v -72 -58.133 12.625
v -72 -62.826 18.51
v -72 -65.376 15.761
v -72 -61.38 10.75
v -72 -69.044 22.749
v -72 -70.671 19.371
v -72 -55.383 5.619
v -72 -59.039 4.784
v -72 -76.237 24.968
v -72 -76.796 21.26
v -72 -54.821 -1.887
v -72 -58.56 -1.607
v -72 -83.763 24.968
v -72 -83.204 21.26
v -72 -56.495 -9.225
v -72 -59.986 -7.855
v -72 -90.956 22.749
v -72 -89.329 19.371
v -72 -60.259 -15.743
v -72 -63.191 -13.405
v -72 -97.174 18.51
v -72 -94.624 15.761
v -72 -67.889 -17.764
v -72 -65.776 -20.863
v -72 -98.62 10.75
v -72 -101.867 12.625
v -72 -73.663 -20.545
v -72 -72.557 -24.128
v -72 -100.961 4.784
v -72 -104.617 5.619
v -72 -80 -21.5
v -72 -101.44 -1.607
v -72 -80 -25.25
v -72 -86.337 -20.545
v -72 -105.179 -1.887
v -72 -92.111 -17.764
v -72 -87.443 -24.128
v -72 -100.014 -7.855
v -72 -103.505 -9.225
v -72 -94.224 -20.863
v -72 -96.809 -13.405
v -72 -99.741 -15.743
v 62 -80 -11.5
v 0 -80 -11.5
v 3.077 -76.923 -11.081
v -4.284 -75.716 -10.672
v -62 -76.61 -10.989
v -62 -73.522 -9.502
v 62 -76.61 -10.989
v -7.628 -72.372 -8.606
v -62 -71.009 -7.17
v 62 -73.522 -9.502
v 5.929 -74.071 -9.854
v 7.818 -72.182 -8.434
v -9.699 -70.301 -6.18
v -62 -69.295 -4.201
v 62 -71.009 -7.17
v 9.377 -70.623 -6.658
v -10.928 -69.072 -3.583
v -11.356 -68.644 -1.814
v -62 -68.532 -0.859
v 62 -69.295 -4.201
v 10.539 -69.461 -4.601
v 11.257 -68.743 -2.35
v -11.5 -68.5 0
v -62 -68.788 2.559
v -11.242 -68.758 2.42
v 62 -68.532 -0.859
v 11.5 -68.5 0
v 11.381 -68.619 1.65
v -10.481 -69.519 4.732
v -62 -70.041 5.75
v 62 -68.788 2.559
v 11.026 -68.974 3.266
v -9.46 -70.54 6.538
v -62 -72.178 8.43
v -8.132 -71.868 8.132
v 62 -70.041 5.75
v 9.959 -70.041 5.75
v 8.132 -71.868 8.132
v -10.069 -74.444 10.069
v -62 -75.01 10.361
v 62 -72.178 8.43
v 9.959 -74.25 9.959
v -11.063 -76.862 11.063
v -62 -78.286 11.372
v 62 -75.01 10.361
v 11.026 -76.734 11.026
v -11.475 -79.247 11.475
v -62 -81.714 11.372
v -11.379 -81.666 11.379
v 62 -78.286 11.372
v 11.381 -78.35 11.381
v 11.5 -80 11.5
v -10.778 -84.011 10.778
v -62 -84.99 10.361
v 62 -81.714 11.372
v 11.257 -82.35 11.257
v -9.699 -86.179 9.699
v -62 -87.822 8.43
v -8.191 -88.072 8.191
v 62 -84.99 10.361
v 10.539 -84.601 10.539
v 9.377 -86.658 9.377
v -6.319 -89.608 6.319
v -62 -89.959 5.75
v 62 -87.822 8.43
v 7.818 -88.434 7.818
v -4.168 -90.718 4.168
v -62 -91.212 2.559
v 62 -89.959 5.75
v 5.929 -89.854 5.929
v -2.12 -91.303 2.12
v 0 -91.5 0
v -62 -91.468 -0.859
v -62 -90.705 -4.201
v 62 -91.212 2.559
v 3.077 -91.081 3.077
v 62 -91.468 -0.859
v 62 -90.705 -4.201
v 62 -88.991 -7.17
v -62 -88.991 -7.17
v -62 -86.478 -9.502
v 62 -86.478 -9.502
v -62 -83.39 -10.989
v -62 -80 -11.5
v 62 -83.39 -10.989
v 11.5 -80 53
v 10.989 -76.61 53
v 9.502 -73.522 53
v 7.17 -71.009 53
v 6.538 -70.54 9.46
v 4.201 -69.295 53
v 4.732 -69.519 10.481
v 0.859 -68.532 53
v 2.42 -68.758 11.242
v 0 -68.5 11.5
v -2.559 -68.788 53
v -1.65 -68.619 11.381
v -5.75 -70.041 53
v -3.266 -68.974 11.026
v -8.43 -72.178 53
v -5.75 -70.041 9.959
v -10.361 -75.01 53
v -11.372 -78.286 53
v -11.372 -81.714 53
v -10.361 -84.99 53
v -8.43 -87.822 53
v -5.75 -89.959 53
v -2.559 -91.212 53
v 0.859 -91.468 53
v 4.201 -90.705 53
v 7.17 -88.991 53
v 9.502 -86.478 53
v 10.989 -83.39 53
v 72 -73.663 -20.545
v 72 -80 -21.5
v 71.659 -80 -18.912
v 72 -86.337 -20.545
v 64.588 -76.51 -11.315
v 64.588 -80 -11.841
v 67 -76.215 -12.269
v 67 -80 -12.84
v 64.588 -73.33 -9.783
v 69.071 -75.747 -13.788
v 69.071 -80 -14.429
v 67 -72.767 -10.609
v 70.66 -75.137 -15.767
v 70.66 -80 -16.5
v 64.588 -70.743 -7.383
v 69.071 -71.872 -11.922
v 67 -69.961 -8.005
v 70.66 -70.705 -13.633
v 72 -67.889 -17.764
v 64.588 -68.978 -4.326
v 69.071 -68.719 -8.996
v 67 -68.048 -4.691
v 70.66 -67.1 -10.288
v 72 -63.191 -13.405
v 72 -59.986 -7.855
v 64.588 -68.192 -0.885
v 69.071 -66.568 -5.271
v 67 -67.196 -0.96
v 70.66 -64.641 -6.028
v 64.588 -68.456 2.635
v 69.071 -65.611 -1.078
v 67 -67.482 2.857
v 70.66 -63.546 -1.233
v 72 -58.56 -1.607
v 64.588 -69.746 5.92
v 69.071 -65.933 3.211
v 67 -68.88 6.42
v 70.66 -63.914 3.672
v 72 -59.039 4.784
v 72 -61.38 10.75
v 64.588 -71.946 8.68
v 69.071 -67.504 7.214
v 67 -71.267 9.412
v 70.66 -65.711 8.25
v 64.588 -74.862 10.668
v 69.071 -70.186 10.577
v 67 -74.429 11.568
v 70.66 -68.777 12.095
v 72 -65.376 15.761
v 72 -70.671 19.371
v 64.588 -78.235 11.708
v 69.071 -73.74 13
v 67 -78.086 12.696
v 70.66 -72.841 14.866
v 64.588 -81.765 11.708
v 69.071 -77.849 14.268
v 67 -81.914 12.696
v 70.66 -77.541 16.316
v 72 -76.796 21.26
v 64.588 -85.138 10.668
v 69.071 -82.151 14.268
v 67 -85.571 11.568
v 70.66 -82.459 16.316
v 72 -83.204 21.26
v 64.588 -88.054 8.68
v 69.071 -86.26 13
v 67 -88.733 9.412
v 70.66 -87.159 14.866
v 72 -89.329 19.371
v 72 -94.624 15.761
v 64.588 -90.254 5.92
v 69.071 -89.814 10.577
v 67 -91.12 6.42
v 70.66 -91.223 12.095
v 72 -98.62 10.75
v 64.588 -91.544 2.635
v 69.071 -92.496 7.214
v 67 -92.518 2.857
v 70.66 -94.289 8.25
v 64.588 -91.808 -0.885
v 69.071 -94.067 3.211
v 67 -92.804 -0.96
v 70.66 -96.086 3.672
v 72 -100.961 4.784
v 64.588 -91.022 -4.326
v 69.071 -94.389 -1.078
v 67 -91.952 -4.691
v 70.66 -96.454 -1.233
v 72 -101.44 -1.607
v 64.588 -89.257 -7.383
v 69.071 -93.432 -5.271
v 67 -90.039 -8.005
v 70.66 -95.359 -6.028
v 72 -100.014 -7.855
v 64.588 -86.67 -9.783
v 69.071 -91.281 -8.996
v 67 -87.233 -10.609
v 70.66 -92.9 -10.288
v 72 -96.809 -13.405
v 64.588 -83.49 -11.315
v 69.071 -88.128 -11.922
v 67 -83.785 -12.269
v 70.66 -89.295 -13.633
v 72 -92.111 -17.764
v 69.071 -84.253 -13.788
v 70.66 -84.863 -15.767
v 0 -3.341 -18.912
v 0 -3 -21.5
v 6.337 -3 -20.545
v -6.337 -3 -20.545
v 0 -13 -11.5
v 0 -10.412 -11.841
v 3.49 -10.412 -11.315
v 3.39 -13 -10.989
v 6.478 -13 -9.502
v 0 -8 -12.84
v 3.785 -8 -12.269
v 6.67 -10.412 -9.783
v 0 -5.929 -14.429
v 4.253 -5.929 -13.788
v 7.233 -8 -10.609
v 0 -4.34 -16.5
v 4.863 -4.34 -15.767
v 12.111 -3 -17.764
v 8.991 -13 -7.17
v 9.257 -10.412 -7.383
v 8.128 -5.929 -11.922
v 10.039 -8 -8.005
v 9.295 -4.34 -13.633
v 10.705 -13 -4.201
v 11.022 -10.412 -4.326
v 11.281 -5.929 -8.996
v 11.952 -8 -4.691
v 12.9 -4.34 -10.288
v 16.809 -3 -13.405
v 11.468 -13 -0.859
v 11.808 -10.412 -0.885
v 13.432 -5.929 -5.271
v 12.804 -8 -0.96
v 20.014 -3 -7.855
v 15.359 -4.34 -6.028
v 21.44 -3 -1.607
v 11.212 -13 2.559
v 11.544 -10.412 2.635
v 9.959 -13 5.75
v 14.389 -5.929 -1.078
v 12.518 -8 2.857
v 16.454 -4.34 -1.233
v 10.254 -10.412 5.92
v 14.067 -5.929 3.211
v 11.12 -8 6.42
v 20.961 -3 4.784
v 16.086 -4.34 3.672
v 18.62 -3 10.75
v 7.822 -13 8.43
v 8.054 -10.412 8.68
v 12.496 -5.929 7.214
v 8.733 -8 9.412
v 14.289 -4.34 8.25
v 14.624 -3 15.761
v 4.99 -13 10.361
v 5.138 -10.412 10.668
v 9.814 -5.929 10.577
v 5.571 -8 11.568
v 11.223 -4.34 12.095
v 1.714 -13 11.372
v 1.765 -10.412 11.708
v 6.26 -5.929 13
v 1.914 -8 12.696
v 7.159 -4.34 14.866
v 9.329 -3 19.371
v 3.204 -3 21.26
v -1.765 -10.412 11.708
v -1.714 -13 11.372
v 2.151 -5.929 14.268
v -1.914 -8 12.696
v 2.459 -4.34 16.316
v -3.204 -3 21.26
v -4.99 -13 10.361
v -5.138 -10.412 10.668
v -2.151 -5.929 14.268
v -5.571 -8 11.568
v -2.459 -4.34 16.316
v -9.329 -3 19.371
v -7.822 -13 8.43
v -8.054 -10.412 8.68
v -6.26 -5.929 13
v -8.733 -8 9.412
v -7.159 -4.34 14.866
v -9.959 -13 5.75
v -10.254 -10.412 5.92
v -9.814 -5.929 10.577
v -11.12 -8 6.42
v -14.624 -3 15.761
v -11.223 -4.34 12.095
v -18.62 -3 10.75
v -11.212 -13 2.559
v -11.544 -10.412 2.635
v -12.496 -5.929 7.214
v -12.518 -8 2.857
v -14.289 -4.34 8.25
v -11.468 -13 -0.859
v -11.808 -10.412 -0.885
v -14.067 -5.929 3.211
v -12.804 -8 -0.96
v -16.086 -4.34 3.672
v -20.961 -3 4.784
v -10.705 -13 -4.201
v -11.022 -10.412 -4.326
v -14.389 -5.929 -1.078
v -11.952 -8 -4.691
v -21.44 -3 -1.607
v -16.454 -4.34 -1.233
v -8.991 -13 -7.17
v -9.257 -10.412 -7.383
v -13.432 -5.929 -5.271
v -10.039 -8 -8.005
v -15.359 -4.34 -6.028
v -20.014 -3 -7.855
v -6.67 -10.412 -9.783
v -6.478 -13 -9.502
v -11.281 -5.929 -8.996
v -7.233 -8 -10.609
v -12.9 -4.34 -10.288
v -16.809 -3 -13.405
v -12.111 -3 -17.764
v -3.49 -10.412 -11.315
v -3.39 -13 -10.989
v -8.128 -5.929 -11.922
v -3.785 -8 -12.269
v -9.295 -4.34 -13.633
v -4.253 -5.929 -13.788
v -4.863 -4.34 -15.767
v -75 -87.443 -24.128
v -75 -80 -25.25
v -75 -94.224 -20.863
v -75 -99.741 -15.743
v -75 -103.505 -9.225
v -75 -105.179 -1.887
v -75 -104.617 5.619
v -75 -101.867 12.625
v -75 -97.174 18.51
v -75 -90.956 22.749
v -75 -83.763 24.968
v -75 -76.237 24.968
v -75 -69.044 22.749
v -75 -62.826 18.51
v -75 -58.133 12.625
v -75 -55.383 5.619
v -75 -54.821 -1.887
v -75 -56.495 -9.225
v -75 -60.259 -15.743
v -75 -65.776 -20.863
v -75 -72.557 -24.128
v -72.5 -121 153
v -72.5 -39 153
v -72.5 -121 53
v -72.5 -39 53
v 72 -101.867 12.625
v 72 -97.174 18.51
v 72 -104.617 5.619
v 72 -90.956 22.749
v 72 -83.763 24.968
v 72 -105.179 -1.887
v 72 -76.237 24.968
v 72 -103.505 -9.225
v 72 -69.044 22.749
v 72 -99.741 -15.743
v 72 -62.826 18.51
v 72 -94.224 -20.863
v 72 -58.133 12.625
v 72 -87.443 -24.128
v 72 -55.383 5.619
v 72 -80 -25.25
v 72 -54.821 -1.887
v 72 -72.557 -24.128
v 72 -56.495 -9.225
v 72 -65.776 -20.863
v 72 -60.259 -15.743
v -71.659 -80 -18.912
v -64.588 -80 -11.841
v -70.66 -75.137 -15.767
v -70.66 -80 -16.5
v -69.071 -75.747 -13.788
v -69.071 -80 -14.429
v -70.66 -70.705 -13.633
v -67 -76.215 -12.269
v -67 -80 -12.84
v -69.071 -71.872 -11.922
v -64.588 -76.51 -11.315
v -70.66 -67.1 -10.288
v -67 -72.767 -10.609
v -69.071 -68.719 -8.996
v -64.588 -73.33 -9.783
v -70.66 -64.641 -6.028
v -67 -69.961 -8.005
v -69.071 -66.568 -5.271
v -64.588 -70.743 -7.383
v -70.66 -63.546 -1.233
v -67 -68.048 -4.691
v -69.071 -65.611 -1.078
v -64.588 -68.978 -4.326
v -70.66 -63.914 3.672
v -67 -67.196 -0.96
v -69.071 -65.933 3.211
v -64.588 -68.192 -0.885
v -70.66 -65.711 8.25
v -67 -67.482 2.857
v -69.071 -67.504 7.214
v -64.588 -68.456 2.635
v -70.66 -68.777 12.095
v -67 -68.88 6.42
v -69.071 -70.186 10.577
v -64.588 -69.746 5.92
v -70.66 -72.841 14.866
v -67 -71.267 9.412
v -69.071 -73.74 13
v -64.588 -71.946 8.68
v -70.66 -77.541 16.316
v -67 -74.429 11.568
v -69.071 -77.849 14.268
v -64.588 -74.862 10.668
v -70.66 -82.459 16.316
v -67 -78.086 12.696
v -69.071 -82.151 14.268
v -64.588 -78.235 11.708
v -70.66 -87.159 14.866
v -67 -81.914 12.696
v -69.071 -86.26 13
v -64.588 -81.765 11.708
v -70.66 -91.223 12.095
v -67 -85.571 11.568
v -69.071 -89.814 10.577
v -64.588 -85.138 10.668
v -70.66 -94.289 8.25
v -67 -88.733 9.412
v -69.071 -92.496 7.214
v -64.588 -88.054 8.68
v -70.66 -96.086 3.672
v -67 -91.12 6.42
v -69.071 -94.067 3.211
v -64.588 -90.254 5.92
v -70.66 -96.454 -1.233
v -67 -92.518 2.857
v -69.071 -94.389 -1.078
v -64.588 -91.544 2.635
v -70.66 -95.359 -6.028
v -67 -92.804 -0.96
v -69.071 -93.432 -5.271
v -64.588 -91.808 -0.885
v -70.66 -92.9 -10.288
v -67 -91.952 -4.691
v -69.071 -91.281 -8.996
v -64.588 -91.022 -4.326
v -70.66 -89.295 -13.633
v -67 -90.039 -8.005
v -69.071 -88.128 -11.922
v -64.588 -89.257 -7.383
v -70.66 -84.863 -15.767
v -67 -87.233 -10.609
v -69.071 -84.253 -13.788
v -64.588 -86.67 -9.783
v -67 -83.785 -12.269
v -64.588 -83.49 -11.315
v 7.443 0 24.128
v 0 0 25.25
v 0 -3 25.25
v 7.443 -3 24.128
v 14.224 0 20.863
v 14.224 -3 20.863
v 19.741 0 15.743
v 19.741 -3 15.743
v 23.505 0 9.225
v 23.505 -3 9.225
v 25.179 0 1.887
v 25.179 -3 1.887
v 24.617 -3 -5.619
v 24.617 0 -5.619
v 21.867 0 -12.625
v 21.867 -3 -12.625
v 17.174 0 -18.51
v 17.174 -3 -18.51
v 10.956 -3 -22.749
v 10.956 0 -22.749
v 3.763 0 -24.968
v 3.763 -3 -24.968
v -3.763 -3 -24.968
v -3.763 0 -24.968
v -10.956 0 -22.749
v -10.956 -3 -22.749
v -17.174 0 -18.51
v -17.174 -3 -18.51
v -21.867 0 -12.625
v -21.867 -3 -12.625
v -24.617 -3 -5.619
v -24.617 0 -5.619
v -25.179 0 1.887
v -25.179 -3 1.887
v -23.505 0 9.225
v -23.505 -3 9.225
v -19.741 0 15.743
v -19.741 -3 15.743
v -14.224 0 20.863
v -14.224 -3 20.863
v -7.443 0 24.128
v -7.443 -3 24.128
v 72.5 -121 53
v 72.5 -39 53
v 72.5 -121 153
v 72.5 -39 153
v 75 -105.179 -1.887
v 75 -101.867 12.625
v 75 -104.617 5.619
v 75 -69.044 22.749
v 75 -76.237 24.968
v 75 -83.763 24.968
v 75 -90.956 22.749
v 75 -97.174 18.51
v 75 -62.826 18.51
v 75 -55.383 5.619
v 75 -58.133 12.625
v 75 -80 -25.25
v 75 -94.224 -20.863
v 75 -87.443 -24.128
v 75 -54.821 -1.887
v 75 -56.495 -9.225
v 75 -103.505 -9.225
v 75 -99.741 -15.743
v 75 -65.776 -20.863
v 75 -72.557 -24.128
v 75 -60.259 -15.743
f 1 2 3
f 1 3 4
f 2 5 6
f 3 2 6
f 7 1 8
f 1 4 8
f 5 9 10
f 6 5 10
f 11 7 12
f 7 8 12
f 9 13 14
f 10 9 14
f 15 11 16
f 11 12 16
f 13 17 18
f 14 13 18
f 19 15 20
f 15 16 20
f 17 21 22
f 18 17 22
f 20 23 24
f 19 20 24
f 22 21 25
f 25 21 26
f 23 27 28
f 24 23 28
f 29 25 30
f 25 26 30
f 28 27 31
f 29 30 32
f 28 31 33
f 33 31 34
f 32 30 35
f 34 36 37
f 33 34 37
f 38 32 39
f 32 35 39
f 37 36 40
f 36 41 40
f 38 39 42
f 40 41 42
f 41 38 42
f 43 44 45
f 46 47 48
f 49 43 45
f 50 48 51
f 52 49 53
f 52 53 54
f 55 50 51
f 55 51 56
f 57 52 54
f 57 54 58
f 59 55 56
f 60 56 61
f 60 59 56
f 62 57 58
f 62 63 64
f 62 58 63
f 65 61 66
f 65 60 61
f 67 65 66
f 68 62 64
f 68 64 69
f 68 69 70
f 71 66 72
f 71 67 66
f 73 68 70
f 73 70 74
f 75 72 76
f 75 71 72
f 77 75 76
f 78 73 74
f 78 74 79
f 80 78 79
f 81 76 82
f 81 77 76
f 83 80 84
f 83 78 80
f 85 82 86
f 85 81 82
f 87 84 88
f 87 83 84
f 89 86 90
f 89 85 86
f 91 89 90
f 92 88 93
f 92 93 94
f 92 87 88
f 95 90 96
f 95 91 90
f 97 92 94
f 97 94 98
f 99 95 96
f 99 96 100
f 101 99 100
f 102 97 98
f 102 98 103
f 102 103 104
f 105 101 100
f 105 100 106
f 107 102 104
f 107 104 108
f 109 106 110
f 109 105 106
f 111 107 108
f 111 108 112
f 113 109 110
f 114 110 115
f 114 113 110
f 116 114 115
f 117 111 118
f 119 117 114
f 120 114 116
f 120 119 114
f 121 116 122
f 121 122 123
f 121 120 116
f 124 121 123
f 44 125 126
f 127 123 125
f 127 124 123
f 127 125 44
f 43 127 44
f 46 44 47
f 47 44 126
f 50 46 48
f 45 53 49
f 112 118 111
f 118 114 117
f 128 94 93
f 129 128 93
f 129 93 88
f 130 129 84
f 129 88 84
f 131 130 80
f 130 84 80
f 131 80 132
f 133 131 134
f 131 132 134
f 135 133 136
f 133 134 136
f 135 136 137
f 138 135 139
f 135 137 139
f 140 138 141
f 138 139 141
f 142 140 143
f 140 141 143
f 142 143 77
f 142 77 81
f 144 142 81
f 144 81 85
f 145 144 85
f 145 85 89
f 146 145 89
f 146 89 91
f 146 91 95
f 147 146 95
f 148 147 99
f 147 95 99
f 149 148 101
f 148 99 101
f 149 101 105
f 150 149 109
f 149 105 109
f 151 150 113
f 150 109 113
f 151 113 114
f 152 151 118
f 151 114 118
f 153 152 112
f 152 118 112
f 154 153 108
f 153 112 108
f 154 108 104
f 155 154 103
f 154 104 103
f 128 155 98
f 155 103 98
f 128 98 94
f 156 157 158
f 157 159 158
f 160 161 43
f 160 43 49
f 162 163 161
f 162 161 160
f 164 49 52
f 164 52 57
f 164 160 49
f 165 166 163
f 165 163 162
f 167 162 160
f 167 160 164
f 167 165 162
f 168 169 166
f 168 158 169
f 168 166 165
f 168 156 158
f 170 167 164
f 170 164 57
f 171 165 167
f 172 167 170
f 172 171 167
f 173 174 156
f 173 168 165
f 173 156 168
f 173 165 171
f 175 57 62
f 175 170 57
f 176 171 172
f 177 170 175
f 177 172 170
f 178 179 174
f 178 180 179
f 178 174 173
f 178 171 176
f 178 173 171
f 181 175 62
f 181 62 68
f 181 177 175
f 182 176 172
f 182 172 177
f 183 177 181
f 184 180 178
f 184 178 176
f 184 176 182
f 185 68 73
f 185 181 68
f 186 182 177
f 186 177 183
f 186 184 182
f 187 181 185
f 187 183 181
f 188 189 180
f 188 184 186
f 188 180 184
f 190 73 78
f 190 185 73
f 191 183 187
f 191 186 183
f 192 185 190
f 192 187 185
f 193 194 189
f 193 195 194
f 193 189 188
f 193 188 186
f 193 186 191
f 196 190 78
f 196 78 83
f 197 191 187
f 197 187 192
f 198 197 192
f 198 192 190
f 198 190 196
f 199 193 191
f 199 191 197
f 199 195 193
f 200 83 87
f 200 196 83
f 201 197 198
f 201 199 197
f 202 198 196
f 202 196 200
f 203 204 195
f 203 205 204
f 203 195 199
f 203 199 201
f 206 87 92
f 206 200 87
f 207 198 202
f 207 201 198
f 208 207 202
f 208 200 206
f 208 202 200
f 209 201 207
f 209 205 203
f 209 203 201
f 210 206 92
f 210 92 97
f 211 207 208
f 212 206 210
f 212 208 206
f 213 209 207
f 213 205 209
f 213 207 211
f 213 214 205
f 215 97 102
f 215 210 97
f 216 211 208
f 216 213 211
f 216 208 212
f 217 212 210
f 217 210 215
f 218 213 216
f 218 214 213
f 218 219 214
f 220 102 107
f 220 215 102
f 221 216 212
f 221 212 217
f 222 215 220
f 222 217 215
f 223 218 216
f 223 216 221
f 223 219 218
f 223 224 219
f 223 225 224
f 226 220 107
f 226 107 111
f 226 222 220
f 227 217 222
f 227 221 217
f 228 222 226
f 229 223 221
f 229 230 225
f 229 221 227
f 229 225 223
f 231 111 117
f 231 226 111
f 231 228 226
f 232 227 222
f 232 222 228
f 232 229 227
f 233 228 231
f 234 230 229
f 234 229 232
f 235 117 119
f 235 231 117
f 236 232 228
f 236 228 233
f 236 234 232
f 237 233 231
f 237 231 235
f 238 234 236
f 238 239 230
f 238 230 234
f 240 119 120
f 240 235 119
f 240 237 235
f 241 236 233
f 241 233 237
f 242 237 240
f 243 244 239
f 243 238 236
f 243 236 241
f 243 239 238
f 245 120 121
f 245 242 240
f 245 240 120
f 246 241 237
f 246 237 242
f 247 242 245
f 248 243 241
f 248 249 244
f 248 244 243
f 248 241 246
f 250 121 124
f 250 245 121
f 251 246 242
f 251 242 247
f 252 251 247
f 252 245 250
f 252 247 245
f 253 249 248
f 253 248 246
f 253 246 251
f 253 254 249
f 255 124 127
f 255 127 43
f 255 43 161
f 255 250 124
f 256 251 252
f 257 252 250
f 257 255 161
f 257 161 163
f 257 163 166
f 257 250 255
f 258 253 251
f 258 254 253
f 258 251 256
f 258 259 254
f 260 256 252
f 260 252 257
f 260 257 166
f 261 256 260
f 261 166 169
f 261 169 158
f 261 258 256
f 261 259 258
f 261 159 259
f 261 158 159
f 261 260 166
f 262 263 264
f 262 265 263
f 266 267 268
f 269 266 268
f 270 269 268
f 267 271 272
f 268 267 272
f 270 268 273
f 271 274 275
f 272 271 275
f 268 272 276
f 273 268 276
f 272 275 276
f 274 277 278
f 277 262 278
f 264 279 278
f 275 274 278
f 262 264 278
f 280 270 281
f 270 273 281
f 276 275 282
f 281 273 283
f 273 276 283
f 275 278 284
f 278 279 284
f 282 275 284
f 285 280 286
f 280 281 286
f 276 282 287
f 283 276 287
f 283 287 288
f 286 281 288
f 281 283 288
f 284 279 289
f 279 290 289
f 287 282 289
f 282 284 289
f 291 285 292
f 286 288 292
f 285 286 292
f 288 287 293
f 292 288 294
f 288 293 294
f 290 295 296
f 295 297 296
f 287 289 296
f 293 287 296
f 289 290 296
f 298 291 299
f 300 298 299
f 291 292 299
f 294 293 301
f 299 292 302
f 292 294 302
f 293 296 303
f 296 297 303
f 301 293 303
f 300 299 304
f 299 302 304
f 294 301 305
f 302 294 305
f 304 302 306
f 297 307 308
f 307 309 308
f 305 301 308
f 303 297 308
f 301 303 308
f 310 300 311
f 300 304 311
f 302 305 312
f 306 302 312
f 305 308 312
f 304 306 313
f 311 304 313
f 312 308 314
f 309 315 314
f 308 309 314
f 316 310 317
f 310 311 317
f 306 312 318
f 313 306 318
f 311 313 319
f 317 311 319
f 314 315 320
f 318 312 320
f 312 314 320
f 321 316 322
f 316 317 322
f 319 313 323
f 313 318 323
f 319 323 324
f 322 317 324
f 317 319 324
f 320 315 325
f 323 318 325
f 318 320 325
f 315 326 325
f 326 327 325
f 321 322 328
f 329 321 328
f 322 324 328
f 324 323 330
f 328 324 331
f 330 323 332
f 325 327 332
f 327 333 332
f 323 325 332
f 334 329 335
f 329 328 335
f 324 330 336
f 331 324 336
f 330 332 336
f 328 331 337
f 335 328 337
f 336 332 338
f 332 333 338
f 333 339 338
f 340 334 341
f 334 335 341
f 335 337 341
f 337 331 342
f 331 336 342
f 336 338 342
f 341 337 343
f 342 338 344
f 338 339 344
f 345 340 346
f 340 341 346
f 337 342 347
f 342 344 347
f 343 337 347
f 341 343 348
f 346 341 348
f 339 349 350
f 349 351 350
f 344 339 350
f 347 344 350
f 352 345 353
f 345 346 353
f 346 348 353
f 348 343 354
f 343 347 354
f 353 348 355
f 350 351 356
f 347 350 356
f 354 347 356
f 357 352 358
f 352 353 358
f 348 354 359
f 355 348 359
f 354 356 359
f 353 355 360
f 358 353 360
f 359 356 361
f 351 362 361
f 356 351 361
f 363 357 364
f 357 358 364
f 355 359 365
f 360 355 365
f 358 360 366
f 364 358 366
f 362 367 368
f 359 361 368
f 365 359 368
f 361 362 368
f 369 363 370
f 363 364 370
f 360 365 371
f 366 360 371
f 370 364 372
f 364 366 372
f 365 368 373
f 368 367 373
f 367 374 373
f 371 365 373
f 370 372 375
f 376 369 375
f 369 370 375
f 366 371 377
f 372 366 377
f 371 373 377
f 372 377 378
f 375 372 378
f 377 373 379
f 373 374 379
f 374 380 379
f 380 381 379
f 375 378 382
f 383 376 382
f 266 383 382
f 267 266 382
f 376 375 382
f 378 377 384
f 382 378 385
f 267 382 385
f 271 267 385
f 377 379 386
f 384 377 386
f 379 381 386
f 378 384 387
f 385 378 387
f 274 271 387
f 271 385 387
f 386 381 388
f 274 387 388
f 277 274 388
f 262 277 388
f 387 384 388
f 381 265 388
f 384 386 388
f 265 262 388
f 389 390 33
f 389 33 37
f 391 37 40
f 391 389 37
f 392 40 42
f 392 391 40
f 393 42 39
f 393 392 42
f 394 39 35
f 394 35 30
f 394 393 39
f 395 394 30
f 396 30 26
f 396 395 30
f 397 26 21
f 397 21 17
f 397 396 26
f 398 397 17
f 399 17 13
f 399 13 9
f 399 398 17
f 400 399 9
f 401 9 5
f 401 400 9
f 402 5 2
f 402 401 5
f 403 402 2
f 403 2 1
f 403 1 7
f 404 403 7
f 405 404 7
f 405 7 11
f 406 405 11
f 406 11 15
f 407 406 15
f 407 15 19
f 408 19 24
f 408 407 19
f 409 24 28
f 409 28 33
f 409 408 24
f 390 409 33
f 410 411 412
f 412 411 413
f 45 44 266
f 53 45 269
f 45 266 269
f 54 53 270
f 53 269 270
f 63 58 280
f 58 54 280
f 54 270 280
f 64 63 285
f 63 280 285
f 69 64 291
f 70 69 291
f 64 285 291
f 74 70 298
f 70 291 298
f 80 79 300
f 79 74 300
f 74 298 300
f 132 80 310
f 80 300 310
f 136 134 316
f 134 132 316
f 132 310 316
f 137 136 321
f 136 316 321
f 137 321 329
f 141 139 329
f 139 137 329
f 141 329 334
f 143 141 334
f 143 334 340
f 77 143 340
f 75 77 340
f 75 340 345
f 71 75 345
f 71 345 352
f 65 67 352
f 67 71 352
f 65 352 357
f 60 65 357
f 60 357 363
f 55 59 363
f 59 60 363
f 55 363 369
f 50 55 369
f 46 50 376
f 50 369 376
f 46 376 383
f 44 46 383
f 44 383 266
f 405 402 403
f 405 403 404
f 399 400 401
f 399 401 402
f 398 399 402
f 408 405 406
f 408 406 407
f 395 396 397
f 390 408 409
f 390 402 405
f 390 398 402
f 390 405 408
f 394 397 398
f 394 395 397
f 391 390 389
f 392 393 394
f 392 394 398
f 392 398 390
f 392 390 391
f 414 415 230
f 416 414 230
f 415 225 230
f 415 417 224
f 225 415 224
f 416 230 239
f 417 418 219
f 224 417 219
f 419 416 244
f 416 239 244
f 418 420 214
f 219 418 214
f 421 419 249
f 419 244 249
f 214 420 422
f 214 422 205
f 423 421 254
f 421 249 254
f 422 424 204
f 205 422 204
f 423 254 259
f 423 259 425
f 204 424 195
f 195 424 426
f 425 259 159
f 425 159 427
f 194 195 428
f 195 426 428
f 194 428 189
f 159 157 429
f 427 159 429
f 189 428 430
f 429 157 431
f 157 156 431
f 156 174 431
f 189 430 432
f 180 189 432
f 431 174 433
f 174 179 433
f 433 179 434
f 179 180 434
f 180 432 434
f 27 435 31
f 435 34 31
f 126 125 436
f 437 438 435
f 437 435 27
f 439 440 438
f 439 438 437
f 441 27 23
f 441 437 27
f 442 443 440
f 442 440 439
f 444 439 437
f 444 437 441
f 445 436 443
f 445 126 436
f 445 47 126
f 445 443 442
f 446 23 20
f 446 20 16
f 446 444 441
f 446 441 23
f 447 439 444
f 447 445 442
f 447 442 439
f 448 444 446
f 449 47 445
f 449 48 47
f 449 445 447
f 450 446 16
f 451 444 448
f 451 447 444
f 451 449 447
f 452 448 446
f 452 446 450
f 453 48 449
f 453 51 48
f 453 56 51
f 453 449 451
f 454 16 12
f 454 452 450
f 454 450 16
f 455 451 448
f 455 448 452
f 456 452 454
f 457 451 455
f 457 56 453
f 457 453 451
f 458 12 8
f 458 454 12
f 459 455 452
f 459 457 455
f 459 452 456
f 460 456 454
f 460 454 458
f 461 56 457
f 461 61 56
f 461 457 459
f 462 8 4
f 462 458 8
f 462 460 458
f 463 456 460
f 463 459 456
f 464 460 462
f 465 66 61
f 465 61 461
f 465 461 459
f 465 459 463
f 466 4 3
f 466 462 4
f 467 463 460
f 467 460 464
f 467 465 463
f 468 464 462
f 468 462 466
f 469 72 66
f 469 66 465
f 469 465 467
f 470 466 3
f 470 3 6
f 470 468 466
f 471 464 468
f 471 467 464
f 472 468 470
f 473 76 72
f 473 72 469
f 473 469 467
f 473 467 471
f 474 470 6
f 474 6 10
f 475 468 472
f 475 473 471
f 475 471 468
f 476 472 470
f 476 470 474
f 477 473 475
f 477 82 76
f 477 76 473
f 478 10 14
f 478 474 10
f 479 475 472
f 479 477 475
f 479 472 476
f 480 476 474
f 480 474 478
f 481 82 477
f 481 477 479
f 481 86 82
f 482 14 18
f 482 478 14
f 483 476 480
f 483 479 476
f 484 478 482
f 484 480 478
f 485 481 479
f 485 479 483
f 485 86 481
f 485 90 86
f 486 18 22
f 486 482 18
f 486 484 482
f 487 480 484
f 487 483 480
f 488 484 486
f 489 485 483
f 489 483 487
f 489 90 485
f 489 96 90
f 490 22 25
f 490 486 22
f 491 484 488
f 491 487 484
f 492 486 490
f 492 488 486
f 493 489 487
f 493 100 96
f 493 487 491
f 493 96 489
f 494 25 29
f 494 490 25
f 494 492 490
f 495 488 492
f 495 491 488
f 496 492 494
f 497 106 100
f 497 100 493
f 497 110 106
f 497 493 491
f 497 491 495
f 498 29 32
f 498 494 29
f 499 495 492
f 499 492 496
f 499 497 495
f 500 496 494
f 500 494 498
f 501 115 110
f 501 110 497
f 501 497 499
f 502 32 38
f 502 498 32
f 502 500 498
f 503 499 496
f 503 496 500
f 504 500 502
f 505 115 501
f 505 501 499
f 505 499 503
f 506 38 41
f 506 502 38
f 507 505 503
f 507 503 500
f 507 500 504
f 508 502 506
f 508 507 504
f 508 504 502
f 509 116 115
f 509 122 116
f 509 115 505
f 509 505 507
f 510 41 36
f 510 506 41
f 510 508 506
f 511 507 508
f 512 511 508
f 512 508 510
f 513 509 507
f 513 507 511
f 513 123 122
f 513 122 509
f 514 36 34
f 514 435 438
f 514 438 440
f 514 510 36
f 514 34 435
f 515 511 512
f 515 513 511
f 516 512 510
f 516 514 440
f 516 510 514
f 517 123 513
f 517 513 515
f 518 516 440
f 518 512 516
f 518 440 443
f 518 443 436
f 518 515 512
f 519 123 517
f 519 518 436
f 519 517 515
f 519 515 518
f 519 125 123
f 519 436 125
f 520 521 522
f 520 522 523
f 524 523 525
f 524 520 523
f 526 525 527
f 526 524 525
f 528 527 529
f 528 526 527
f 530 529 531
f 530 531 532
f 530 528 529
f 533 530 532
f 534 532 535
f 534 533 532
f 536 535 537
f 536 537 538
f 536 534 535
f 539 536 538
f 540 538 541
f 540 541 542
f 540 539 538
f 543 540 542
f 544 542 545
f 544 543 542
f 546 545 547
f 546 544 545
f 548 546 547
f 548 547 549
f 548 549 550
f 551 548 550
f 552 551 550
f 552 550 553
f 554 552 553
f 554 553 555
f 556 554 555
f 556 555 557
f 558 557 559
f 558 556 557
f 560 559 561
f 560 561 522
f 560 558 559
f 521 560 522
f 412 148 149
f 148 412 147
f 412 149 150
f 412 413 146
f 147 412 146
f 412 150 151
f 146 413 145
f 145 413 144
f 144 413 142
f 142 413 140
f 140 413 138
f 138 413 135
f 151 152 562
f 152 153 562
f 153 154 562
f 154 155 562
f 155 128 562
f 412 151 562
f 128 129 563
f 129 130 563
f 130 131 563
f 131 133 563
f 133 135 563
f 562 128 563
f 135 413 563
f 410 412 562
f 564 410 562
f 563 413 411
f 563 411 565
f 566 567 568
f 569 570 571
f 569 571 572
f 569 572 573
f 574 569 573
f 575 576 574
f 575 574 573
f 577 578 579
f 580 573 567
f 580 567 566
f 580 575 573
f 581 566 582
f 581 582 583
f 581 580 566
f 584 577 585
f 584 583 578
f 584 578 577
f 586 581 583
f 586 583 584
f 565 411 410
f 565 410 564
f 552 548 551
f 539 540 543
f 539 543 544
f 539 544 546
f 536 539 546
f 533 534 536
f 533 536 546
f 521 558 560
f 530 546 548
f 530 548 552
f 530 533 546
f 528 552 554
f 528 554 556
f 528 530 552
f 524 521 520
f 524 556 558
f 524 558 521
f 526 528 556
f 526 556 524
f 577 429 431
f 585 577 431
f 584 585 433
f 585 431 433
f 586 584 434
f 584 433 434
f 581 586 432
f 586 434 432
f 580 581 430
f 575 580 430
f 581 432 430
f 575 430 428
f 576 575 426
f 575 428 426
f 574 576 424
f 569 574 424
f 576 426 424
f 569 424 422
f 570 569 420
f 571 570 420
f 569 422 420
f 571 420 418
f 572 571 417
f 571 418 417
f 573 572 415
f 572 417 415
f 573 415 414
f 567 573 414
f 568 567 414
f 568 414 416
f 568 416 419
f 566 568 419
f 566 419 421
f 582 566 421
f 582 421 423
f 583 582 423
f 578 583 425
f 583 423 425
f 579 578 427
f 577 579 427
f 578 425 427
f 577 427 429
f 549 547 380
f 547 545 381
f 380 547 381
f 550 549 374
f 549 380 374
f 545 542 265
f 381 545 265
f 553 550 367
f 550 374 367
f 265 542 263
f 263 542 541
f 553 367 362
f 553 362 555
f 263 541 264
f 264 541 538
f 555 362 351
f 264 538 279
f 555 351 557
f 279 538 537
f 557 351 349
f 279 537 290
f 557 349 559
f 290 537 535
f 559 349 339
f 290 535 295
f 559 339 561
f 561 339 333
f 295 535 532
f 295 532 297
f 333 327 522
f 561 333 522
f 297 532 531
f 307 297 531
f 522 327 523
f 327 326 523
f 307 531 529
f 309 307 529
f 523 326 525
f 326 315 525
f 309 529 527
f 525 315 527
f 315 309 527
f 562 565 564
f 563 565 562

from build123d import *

# Parameters (mm, degrees)
SKETCH_2_R      = 25.25
EXTRUDE_1_DEPTH = 3
SKETCH_3_R      = 11.5
EXTRUDE_2_DEPTH = 77
SKETCH_4_R      = 11.5
EXTRUDE_3_DEPTH = 72
SKETCH_5_R      = 25.25
EXTRUDE_4_DEPTH = 3
EXTRUDE_START   = 3
SKETCH_6_R      = 25.25
EXTRUDE_5_DEPTH = 3
FILLET_1_R      = 10
SKETCH_7_R      = 11.5
EXTRUDE_6_DEPTH = 53
SKETCH_8_W      = 145
SKETCH_8_H      = 100
EXTRUDE_7_DEPTH = 41


with BuildPart() as part:
    # 스케치2 → 보스-돌출1 (new body)
    with BuildSketch(Plane(origin=(0, 0, 0), x_dir=(1, 0, 0), z_dir=(0, 1, 0))):
        Circle(SKETCH_2_R)
    extrude(amount=-EXTRUDE_1_DEPTH)

    # 스케치3 → 보스-돌출2 (add)
    with BuildSketch(Plane.XZ.offset(3)):
        Circle(SKETCH_3_R)
    extrude(amount=EXTRUDE_2_DEPTH)

    # 스케치4 → 보스-돌출3 (add, symmetric)
    with BuildSketch(Plane(origin=(0, 0, 0), x_dir=(0, 0, -1), z_dir=(1, 0, 0))):
        with Locations((0, -80)):
            Circle(SKETCH_4_R)
    extrude(amount=EXTRUDE_3_DEPTH, both=True)

    # 스케치5 → 보스-돌출4 (add)
    with BuildSketch(Plane(origin=(72, 0, 0), x_dir=(0, 0, -1), z_dir=(1, 0, 0))):
        with Locations((0, -80)):
            Circle(SKETCH_5_R)
    extrude(amount=EXTRUDE_4_DEPTH)

    # 스케치6 → 보스-돌출5 (add)
    with BuildSketch(Plane.ZY.offset(72).offset(EXTRUDE_START)):
        with Locations((0, -80)):
            Circle(SKETCH_6_R)
    extrude(amount=-EXTRUDE_5_DEPTH)

    # 필렛1
    fillet_1_edges = [part.edges().sort_by_distance(p)[0] for p in [
        (-72, -80, 11.5),
        (-11.5, -3, 0),
        (72, -80, 11.5),
    ]]
    fillet(fillet_1_edges, radius=FILLET_1_R)

    # 스케치7 → 보스-돌출6 (add)
    with BuildSketch(Plane.XY):
        with Locations((0, -80)):
            Circle(SKETCH_7_R)
    extrude(amount=EXTRUDE_6_DEPTH)

    # 스케치8 → 보스-돌출7 (add, symmetric)
    with BuildSketch(Plane(origin=(0, -80, 0), x_dir=(1, 0, 0), z_dir=(0, 1, 0))):
        with Locations((0, -103)):
            Rectangle(SKETCH_8_W, SKETCH_8_H)
    extrude(amount=EXTRUDE_7_DEPTH, both=True)


solid = part.part
